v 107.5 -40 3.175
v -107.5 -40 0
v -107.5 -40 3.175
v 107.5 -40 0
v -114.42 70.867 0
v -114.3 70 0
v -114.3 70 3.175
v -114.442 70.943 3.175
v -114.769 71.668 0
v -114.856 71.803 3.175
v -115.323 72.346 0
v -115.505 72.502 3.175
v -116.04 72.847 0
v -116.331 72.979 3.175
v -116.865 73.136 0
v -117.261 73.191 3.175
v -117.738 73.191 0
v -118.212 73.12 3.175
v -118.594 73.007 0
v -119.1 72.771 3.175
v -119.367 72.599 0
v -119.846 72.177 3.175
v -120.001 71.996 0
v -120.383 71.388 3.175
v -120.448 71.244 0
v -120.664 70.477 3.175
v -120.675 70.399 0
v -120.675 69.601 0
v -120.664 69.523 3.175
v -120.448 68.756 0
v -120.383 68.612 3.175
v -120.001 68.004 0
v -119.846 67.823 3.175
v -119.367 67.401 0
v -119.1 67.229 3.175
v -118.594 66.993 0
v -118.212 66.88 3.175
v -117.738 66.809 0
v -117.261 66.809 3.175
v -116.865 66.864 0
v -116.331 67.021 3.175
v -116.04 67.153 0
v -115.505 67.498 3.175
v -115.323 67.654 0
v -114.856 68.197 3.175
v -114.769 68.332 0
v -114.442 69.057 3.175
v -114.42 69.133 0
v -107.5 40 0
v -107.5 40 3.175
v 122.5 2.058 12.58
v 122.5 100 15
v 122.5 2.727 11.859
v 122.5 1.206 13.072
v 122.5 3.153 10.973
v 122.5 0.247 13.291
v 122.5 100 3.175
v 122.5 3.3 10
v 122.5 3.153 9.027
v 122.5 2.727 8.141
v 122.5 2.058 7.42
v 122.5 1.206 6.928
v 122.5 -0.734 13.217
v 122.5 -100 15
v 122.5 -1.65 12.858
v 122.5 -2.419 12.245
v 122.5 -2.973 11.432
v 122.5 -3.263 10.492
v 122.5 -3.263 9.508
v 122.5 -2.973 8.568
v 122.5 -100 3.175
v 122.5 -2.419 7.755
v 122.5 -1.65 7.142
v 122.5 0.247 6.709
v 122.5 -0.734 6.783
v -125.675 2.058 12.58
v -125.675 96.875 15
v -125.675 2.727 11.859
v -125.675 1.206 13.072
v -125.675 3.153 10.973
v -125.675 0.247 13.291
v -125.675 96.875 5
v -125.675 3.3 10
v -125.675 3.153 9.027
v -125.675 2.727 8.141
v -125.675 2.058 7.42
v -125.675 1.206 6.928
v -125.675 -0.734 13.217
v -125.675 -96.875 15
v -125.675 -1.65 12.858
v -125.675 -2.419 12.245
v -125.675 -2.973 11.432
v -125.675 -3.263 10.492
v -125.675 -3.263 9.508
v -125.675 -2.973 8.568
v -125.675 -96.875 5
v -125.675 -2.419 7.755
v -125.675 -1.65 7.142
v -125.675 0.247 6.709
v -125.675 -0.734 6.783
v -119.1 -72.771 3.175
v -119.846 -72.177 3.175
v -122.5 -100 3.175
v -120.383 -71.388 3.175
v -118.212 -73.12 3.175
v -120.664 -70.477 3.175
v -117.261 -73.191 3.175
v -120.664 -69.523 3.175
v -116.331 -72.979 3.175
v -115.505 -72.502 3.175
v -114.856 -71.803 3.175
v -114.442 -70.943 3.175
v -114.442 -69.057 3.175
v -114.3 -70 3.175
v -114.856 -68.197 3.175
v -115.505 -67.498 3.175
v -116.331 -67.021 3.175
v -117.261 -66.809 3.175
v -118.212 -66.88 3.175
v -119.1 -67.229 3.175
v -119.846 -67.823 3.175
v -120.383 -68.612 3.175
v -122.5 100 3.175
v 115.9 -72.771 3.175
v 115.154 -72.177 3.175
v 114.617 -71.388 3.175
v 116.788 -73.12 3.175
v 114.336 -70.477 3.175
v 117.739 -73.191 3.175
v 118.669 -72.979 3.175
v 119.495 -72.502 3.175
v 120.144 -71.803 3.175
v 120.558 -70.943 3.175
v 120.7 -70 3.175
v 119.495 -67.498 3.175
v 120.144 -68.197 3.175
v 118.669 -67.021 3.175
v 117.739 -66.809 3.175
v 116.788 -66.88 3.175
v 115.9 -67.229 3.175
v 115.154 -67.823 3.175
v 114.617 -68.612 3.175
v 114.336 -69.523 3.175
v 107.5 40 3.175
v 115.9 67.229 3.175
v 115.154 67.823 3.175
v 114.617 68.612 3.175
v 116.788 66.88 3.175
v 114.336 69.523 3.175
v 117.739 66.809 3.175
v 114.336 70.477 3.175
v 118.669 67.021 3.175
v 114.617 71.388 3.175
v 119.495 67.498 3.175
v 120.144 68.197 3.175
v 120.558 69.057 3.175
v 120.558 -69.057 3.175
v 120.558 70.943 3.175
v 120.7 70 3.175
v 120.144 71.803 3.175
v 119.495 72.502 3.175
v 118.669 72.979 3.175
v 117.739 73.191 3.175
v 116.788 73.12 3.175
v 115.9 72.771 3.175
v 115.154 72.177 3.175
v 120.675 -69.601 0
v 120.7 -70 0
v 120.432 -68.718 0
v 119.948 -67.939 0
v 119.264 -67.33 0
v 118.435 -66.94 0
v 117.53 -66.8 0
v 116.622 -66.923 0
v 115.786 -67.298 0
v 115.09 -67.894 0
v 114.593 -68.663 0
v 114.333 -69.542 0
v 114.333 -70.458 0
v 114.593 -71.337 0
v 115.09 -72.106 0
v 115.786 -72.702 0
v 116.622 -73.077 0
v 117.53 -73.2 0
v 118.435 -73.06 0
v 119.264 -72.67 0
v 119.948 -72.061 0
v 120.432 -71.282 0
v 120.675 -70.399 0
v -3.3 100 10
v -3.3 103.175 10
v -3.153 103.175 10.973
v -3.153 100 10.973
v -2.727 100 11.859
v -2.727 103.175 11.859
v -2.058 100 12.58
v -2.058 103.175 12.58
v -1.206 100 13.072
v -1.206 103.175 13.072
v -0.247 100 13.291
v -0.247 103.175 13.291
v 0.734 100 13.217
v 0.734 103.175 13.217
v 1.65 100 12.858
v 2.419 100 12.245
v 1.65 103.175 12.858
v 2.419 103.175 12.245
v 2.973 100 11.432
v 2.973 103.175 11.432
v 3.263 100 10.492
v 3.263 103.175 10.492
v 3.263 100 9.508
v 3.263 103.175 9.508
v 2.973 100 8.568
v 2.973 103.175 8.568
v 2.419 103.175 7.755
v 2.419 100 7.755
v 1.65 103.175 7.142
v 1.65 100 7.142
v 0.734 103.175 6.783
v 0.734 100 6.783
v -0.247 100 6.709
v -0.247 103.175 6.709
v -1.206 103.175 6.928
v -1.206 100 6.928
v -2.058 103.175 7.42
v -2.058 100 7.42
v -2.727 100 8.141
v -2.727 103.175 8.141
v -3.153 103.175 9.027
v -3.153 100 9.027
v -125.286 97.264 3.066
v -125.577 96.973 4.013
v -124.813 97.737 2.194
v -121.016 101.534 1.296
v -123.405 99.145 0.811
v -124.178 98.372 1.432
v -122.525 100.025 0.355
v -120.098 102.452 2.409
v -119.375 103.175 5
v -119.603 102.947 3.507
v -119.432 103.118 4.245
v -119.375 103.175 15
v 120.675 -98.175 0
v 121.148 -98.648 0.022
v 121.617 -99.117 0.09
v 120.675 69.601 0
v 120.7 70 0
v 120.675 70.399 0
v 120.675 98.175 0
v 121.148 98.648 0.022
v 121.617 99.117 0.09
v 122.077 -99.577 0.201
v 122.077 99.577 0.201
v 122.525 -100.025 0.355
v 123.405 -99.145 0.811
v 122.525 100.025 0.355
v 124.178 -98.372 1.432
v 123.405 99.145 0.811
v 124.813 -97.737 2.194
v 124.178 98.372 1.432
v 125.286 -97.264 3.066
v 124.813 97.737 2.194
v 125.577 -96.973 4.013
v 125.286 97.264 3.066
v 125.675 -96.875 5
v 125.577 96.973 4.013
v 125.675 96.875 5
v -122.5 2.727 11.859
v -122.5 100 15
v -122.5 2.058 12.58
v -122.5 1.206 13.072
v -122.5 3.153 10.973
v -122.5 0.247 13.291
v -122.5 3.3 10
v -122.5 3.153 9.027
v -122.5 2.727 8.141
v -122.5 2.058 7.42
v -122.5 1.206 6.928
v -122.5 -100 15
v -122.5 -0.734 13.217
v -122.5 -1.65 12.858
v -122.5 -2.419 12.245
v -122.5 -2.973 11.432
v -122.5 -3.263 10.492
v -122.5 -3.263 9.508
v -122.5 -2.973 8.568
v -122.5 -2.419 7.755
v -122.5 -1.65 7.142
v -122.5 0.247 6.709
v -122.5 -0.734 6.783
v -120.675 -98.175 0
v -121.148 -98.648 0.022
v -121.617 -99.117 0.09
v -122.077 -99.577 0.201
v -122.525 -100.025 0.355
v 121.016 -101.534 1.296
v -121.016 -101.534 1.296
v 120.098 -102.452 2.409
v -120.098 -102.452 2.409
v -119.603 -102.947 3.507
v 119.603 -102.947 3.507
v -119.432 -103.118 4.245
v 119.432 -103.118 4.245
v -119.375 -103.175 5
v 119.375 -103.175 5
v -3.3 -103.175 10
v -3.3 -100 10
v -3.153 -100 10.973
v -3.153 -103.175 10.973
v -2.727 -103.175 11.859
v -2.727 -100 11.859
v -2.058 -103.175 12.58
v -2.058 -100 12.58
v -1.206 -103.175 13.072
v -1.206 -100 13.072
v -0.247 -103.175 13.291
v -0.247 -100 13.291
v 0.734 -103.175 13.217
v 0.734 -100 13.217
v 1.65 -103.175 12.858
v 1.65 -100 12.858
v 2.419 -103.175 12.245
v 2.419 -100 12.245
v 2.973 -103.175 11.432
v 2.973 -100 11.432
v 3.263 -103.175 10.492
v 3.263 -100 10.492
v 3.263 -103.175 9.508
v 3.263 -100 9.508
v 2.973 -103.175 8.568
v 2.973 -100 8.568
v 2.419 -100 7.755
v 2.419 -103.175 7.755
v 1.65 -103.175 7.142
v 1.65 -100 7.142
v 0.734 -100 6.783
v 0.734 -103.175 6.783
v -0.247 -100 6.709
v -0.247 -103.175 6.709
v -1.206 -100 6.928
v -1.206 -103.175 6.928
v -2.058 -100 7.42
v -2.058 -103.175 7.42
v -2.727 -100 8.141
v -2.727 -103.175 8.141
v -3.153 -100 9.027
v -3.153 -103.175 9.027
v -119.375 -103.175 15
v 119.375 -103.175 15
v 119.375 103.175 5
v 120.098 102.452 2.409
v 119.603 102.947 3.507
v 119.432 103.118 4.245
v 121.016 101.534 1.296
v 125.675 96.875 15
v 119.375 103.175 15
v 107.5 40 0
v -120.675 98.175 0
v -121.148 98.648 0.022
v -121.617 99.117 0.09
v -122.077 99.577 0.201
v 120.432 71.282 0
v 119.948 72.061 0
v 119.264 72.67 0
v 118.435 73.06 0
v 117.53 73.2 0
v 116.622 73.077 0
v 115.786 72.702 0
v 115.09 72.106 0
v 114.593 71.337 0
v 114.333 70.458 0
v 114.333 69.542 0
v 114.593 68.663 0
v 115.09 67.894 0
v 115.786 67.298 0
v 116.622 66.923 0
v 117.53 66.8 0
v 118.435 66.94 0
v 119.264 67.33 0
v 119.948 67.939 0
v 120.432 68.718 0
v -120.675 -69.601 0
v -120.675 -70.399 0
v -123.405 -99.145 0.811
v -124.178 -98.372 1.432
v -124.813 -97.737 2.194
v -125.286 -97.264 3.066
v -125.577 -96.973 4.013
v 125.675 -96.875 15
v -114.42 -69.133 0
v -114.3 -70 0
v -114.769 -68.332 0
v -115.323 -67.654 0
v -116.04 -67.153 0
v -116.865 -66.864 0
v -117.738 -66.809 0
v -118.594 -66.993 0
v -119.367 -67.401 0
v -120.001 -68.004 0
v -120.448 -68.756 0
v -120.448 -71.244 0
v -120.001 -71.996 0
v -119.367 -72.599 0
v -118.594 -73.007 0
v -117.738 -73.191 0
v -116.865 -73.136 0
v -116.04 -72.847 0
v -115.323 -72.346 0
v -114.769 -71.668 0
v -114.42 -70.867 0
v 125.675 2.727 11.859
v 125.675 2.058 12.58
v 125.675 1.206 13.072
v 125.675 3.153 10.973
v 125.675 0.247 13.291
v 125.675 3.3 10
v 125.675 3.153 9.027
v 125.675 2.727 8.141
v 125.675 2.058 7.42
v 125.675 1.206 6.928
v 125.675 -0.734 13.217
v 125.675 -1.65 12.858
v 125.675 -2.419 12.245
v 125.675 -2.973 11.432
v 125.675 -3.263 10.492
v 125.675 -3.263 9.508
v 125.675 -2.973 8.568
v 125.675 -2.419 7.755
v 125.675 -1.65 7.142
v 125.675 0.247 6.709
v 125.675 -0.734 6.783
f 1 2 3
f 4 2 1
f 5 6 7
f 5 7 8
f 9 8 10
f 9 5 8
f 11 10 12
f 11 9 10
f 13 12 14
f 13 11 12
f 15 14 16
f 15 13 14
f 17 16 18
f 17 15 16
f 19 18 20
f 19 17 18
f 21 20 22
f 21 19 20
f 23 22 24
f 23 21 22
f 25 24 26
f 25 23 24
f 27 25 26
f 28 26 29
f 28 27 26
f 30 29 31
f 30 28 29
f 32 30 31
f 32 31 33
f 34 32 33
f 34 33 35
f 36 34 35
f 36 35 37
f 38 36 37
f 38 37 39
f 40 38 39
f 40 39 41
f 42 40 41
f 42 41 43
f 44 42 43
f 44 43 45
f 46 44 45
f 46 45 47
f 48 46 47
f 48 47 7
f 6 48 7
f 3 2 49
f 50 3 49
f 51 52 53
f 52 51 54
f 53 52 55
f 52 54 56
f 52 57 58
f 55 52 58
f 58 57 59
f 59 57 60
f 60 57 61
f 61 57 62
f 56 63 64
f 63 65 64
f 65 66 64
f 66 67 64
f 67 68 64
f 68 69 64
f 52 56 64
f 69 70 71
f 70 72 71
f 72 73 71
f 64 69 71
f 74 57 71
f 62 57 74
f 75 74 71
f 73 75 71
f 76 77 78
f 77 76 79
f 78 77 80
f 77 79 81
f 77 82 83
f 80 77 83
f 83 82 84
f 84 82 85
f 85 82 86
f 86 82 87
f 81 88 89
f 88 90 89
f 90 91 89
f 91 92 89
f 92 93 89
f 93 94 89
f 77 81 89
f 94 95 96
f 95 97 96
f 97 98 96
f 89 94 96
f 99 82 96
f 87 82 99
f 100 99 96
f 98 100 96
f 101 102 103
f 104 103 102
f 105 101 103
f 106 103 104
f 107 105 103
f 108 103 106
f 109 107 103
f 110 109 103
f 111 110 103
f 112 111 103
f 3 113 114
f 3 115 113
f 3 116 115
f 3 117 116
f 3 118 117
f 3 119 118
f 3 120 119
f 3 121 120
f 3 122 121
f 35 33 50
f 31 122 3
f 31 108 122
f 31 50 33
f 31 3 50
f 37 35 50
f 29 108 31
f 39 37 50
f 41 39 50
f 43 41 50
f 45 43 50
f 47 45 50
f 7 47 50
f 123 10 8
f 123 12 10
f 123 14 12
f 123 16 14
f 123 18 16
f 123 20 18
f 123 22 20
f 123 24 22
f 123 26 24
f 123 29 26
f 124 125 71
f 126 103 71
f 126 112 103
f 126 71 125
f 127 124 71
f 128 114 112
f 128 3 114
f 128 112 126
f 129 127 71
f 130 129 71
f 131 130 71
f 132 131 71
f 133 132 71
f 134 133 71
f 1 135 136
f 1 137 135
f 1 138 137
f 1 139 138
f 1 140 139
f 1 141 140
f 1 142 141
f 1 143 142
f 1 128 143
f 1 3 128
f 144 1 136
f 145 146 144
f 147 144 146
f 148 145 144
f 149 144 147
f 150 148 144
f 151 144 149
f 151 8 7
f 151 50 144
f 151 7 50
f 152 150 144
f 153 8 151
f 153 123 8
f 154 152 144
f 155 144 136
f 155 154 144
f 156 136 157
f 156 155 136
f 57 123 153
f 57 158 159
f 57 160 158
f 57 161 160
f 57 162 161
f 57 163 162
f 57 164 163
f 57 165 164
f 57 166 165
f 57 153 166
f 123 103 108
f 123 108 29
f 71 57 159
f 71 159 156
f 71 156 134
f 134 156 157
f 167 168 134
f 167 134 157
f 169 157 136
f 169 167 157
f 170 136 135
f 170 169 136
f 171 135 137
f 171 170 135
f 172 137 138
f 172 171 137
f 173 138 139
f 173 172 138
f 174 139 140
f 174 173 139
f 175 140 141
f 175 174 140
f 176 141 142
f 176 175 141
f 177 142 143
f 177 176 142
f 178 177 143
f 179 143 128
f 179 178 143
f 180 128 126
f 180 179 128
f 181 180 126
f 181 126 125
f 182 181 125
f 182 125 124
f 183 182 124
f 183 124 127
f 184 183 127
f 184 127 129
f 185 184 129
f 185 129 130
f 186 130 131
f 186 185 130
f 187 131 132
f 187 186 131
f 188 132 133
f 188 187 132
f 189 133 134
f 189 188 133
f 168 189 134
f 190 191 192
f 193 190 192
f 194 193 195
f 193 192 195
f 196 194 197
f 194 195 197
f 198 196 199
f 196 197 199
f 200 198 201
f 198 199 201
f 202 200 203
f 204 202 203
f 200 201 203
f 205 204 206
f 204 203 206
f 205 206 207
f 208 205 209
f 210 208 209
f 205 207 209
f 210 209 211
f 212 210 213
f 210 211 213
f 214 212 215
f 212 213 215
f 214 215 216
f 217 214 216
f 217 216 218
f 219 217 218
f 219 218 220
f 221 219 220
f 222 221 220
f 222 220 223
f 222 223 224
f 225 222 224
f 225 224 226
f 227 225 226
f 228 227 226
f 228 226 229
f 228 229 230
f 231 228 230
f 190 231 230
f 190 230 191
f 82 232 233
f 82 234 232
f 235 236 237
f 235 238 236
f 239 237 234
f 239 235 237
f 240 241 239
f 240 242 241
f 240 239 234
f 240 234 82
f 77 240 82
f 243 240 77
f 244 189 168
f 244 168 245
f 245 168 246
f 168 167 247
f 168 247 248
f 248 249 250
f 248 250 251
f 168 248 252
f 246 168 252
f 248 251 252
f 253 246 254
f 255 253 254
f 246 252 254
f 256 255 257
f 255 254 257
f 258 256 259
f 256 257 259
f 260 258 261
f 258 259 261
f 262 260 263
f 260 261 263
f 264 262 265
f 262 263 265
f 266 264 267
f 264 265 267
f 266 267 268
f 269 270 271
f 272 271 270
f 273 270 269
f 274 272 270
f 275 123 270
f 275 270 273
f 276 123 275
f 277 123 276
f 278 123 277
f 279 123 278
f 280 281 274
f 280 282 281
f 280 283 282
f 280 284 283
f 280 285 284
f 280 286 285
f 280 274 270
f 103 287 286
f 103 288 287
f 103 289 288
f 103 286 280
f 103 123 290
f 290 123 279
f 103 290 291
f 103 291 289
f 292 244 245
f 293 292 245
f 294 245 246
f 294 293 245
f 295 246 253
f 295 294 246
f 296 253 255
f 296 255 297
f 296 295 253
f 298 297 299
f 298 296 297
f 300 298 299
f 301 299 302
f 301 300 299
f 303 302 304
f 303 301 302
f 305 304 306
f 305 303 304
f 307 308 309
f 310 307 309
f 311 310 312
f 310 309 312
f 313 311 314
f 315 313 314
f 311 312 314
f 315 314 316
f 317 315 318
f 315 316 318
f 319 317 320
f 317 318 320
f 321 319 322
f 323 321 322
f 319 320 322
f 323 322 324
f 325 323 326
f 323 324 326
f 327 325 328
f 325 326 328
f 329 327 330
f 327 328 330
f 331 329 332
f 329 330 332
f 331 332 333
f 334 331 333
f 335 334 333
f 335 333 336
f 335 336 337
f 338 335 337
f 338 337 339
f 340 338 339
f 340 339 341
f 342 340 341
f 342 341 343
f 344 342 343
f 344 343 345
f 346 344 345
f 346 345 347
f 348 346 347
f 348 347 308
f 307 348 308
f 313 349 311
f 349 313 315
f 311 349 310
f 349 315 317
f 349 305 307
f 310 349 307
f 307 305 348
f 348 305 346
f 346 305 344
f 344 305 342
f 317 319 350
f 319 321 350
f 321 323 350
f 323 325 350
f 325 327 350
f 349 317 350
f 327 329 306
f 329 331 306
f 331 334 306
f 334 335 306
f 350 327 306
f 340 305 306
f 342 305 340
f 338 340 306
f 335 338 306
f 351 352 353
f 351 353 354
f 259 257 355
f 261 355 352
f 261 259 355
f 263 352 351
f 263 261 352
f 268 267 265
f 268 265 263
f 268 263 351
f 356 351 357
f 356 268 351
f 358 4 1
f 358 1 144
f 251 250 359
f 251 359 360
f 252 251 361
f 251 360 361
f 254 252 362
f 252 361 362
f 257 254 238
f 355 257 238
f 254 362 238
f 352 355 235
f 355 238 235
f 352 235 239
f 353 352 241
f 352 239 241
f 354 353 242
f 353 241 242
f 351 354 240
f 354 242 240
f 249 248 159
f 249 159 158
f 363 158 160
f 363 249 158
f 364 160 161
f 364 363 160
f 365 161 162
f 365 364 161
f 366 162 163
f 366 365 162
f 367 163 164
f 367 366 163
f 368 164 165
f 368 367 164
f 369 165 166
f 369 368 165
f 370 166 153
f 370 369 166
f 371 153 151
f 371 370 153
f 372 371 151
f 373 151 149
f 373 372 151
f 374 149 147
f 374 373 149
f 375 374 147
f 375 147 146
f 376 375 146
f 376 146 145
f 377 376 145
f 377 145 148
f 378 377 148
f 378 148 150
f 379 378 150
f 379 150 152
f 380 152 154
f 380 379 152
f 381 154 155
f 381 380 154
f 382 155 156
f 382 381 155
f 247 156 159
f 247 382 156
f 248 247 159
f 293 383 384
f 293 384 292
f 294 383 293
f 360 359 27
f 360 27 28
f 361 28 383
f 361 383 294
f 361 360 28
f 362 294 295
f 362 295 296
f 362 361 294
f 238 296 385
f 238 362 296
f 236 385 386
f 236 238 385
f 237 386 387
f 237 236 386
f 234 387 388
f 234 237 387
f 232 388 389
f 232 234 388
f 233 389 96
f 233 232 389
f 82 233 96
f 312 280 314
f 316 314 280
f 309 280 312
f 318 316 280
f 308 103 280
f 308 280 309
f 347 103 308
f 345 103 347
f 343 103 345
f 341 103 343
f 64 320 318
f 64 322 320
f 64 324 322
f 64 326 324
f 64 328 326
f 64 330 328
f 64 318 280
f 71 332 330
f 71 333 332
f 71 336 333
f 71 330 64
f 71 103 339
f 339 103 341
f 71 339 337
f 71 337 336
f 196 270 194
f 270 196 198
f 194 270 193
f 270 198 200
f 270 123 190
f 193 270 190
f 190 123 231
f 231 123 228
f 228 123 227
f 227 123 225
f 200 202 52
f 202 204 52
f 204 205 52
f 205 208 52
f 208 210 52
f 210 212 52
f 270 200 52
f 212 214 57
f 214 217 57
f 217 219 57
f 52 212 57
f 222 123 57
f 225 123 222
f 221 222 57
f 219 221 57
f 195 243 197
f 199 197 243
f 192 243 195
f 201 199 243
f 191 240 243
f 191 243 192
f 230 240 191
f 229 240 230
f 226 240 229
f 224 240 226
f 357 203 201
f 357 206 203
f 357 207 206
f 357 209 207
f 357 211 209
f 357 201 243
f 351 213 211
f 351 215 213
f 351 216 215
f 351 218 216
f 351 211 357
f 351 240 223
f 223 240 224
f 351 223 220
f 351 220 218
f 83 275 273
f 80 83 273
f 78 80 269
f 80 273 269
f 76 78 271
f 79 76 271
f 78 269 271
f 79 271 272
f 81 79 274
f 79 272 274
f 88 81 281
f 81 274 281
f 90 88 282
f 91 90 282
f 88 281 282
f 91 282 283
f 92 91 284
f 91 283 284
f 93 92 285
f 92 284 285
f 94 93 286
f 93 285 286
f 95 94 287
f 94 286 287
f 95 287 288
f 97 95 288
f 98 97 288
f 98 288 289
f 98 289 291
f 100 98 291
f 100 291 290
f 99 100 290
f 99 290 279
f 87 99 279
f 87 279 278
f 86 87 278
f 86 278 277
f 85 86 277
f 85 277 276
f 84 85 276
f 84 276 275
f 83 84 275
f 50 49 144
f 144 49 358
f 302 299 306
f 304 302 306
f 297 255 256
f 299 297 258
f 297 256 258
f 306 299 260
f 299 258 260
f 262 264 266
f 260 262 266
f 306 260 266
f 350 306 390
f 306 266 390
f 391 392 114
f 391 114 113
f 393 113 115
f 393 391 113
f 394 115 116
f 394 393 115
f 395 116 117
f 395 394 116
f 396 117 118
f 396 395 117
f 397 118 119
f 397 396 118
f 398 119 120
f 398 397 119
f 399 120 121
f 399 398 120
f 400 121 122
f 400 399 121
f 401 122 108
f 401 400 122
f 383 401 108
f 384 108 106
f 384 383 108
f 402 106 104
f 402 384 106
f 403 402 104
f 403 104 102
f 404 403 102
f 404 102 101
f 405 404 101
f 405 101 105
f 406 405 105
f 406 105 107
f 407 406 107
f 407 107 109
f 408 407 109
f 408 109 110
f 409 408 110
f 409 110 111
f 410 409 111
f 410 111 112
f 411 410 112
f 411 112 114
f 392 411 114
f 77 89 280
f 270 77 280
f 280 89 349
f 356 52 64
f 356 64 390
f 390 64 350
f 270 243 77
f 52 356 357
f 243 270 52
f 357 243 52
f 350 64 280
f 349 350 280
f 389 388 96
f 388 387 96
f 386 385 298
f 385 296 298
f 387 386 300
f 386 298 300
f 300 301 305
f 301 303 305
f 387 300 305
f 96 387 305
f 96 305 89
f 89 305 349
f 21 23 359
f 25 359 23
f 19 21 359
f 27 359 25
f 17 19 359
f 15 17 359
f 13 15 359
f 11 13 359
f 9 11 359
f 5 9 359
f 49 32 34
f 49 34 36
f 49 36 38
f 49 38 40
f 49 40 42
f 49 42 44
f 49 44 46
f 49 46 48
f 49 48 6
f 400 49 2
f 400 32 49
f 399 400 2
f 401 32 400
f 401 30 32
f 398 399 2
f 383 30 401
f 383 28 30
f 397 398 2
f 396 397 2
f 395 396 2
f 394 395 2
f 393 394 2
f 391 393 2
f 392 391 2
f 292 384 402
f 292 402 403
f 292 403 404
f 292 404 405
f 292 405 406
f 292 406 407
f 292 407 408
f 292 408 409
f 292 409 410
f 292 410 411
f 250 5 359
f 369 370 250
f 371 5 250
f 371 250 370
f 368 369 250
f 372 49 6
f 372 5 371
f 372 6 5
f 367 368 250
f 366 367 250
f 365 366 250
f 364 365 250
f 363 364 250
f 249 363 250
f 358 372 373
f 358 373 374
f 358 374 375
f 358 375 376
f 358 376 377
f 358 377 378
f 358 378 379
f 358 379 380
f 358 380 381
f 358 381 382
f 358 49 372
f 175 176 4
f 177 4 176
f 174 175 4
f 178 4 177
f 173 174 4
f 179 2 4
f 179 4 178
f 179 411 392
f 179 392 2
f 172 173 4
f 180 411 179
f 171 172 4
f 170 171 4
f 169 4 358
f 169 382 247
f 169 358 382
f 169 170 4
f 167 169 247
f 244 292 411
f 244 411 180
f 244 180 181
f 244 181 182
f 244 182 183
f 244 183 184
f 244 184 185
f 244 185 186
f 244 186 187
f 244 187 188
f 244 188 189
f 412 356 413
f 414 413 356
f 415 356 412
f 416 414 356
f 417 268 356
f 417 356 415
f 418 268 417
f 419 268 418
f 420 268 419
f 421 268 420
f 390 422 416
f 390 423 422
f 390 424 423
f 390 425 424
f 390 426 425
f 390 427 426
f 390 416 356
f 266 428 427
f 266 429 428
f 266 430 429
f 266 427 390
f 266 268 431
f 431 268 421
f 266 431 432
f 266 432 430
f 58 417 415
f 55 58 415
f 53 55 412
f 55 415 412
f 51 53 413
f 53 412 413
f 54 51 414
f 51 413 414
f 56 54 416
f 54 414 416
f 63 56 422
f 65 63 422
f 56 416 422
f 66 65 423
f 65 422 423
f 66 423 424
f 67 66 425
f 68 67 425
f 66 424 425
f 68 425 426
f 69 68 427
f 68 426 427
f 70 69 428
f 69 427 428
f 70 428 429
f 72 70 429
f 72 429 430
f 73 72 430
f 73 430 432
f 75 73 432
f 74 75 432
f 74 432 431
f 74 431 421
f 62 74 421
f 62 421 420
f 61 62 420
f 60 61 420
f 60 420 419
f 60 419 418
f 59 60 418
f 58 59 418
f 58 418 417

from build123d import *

# Parameters (mm, degrees)
F0_W         = 245
F0_H         = 200
F0_R         = 3.2
F0_W_2       = 215
F0_H_2       = 80
F1_DEPTH     = 3.175
F2_W         = 251.35
F2_H         = 206.35
F2_W_2       = 245
F2_H_2       = 200
F3_DEPTH     = 15
F4_SIZE      = 6.3
F6_R         = 3.3
F7_DEPTH     = 251.351
F8_R         = 3.3
F9_DEPTH     = 206.351
F10_T1_DEPTH = 263.75
F10_T3_DEPTH = 218.75


# Not quite as in the source:
# - a fillet or chamfer that OpenCascade refuses, or shapes differently, is made with other operations: its cross-section is extruded or revolved along the edge and cut away or added


with BuildPart() as f1:
    # F0 (on Top) → F1 (new body)
    with BuildSketch(Plane.XY):
        Rectangle(F0_W, F0_H)
        with Locations((-117.5, -70)):
            Circle(F0_R, mode=Mode.SUBTRACT)
        with Locations((117.5, -70)):
            Circle(F0_R, mode=Mode.SUBTRACT)
        with Locations((-117.5, 70)):
            Circle(F0_R, mode=Mode.SUBTRACT)
        Rectangle(F0_W_2, F0_H_2, mode=Mode.SUBTRACT)
        with Locations((117.5, 70)):
            Circle(F0_R, mode=Mode.SUBTRACT)
    extrude(amount=F1_DEPTH)

    # F2 (on face) → F3 (join)
    with BuildSketch(Plane(origin=(0, 0, 0), x_dir=(1, 0, 0), z_dir=(0, 0, -1))):
        Rectangle(F2_W, F2_H)
        Rectangle(F2_W_2, F2_H_2, mode=Mode.SUBTRACT)
    extrude(amount=-F3_DEPTH)

    # F4
    f4_edges = [f1.edges().sort_by_distance(p)[0] for p in [
        (-125.675, 103.175, 7.5),
        (125.675, 103.175, 7.5),
        (125.675, -103.175, 7.5),
        (-125.675, -103.175, 7.5),
    ]]
    chamfer(f4_edges, length=F4_SIZE)

    # F6 (on face) → F7 (cut, through all)
    with BuildSketch(Plane.YZ.offset(125.675)):
        with Locations((0, 10)):
            Circle(F6_R)
    extrude(amount=-F7_DEPTH, mode=Mode.SUBTRACT)

    # F8 (on face) → F9 (cut, through all)
    with BuildSketch(Plane(origin=(0, 103.175, 0), x_dir=(-1, 0, 0), z_dir=(0, 1, 0))):
        with Locations((0, 10)):
            Circle(F8_R)
    extrude(amount=-F9_DEPTH, mode=Mode.SUBTRACT)

    # F10: fillet of radius 5 on 4 edges, made by hand

    # F10_s2 → F10_t1 (cut)
    with BuildSketch(Plane.YZ.offset(-131.875)):
        with BuildLine():
            ThreePointArc((-98.175, 0), (-101.7105339059, 1.4644660941), (-103.175, 5))
            Line((-103.175, 5), (-103.175, 0))
            Line((-103.175, 0), (-98.175, 0))
        make_face()
        with BuildLine():
            ThreePointArc((98.175, 0), (101.7105339059, 1.4644660941), (103.175, 5))
            Line((103.175, 5), (103.175, 0))
            Line((103.175, 0), (98.175, 0))
        make_face()
    extrude(amount=F10_T1_DEPTH, mode=Mode.SUBTRACT)

    # F10_s4 → F10_t3 (cut)
    with BuildSketch(Plane.XZ.offset(-109.375)):
        with BuildLine():
            ThreePointArc((-120.675, 0), (-124.2105339059, 1.4644660941), (-125.675, 5))
            Line((-125.675, 5), (-125.675, 0))
            Line((-125.675, 0), (-120.675, 0))
        make_face()
        with BuildLine():
            ThreePointArc((120.675, 0), (124.2105339059, 1.4644660941), (125.675, 5))
            Line((125.675, 5), (125.675, 0))
            Line((125.675, 0), (120.675, 0))
        make_face()
    extrude(amount=F10_T3_DEPTH, mode=Mode.SUBTRACT)


solid = f1.part
